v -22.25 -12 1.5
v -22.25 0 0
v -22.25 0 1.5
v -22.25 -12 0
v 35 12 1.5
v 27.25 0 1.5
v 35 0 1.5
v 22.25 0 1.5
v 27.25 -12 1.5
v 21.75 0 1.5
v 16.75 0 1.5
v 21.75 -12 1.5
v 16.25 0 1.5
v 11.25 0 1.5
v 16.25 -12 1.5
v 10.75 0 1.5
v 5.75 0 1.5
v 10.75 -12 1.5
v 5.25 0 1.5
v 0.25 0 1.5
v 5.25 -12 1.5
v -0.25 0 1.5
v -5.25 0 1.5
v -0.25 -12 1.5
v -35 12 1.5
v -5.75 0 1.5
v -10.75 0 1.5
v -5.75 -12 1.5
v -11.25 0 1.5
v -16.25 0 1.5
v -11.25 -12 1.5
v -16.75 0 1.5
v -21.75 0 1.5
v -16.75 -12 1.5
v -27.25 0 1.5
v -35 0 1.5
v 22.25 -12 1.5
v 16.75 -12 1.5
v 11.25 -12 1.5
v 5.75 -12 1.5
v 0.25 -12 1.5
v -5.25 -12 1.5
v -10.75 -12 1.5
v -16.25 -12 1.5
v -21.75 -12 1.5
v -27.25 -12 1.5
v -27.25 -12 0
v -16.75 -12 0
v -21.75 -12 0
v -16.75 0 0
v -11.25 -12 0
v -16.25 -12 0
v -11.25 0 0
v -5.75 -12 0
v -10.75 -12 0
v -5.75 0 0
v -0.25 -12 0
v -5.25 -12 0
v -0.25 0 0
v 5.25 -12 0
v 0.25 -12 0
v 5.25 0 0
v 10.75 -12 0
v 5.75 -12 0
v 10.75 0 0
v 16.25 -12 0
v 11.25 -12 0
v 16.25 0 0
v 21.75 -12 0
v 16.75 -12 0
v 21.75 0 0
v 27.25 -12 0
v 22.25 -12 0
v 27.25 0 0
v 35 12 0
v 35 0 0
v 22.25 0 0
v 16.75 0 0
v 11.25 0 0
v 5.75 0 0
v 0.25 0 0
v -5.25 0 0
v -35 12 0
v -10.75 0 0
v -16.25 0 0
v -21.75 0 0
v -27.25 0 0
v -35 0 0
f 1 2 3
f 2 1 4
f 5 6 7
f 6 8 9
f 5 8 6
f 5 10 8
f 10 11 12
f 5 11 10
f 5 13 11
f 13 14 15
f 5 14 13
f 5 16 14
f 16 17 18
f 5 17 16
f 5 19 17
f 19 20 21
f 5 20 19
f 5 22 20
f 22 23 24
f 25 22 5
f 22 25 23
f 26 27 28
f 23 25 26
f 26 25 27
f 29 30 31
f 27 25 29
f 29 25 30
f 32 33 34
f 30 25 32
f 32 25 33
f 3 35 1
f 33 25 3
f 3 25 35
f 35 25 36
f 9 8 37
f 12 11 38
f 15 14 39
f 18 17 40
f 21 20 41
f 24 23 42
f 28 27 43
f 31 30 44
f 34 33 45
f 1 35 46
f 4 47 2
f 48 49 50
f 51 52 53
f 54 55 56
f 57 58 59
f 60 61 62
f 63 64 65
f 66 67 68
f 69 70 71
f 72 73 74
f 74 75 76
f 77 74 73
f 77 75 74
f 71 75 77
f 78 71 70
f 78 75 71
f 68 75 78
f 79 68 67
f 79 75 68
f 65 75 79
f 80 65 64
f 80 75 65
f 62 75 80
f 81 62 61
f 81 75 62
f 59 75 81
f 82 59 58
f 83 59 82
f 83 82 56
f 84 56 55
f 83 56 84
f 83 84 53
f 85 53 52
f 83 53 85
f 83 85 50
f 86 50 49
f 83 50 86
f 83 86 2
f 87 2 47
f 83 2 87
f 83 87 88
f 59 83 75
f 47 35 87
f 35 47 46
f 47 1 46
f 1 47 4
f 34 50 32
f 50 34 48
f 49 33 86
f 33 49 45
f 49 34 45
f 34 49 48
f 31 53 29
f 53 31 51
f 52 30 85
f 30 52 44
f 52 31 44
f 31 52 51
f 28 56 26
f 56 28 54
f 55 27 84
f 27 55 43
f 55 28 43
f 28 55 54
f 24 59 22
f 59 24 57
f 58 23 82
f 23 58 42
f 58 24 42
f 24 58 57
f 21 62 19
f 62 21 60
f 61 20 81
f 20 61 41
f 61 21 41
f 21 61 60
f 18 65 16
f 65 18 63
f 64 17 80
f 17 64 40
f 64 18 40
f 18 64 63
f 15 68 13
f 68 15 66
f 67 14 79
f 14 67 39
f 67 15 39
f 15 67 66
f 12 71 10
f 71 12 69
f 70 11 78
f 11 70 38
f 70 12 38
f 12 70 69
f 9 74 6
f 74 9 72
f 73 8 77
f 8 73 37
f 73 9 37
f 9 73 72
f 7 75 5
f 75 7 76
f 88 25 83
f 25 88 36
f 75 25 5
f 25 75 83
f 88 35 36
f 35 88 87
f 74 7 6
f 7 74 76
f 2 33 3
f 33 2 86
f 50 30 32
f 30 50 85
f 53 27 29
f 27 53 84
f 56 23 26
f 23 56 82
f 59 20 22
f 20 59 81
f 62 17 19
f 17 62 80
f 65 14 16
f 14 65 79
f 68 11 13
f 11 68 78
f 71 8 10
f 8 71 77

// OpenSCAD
// 10 teeth 5 mm wide but 0.5 mm gaps (wells on the wrong pitch), spine 70 x 12
translate([-35,0,0]) cube([70,12,1.5]);
for (i=[0:9]) translate([-27.25 + i*5.5 - 2.5 + 2.5, -12, 0]) translate([-2.5+2.5,0,0]) cube([5,12.01,1.5]);
